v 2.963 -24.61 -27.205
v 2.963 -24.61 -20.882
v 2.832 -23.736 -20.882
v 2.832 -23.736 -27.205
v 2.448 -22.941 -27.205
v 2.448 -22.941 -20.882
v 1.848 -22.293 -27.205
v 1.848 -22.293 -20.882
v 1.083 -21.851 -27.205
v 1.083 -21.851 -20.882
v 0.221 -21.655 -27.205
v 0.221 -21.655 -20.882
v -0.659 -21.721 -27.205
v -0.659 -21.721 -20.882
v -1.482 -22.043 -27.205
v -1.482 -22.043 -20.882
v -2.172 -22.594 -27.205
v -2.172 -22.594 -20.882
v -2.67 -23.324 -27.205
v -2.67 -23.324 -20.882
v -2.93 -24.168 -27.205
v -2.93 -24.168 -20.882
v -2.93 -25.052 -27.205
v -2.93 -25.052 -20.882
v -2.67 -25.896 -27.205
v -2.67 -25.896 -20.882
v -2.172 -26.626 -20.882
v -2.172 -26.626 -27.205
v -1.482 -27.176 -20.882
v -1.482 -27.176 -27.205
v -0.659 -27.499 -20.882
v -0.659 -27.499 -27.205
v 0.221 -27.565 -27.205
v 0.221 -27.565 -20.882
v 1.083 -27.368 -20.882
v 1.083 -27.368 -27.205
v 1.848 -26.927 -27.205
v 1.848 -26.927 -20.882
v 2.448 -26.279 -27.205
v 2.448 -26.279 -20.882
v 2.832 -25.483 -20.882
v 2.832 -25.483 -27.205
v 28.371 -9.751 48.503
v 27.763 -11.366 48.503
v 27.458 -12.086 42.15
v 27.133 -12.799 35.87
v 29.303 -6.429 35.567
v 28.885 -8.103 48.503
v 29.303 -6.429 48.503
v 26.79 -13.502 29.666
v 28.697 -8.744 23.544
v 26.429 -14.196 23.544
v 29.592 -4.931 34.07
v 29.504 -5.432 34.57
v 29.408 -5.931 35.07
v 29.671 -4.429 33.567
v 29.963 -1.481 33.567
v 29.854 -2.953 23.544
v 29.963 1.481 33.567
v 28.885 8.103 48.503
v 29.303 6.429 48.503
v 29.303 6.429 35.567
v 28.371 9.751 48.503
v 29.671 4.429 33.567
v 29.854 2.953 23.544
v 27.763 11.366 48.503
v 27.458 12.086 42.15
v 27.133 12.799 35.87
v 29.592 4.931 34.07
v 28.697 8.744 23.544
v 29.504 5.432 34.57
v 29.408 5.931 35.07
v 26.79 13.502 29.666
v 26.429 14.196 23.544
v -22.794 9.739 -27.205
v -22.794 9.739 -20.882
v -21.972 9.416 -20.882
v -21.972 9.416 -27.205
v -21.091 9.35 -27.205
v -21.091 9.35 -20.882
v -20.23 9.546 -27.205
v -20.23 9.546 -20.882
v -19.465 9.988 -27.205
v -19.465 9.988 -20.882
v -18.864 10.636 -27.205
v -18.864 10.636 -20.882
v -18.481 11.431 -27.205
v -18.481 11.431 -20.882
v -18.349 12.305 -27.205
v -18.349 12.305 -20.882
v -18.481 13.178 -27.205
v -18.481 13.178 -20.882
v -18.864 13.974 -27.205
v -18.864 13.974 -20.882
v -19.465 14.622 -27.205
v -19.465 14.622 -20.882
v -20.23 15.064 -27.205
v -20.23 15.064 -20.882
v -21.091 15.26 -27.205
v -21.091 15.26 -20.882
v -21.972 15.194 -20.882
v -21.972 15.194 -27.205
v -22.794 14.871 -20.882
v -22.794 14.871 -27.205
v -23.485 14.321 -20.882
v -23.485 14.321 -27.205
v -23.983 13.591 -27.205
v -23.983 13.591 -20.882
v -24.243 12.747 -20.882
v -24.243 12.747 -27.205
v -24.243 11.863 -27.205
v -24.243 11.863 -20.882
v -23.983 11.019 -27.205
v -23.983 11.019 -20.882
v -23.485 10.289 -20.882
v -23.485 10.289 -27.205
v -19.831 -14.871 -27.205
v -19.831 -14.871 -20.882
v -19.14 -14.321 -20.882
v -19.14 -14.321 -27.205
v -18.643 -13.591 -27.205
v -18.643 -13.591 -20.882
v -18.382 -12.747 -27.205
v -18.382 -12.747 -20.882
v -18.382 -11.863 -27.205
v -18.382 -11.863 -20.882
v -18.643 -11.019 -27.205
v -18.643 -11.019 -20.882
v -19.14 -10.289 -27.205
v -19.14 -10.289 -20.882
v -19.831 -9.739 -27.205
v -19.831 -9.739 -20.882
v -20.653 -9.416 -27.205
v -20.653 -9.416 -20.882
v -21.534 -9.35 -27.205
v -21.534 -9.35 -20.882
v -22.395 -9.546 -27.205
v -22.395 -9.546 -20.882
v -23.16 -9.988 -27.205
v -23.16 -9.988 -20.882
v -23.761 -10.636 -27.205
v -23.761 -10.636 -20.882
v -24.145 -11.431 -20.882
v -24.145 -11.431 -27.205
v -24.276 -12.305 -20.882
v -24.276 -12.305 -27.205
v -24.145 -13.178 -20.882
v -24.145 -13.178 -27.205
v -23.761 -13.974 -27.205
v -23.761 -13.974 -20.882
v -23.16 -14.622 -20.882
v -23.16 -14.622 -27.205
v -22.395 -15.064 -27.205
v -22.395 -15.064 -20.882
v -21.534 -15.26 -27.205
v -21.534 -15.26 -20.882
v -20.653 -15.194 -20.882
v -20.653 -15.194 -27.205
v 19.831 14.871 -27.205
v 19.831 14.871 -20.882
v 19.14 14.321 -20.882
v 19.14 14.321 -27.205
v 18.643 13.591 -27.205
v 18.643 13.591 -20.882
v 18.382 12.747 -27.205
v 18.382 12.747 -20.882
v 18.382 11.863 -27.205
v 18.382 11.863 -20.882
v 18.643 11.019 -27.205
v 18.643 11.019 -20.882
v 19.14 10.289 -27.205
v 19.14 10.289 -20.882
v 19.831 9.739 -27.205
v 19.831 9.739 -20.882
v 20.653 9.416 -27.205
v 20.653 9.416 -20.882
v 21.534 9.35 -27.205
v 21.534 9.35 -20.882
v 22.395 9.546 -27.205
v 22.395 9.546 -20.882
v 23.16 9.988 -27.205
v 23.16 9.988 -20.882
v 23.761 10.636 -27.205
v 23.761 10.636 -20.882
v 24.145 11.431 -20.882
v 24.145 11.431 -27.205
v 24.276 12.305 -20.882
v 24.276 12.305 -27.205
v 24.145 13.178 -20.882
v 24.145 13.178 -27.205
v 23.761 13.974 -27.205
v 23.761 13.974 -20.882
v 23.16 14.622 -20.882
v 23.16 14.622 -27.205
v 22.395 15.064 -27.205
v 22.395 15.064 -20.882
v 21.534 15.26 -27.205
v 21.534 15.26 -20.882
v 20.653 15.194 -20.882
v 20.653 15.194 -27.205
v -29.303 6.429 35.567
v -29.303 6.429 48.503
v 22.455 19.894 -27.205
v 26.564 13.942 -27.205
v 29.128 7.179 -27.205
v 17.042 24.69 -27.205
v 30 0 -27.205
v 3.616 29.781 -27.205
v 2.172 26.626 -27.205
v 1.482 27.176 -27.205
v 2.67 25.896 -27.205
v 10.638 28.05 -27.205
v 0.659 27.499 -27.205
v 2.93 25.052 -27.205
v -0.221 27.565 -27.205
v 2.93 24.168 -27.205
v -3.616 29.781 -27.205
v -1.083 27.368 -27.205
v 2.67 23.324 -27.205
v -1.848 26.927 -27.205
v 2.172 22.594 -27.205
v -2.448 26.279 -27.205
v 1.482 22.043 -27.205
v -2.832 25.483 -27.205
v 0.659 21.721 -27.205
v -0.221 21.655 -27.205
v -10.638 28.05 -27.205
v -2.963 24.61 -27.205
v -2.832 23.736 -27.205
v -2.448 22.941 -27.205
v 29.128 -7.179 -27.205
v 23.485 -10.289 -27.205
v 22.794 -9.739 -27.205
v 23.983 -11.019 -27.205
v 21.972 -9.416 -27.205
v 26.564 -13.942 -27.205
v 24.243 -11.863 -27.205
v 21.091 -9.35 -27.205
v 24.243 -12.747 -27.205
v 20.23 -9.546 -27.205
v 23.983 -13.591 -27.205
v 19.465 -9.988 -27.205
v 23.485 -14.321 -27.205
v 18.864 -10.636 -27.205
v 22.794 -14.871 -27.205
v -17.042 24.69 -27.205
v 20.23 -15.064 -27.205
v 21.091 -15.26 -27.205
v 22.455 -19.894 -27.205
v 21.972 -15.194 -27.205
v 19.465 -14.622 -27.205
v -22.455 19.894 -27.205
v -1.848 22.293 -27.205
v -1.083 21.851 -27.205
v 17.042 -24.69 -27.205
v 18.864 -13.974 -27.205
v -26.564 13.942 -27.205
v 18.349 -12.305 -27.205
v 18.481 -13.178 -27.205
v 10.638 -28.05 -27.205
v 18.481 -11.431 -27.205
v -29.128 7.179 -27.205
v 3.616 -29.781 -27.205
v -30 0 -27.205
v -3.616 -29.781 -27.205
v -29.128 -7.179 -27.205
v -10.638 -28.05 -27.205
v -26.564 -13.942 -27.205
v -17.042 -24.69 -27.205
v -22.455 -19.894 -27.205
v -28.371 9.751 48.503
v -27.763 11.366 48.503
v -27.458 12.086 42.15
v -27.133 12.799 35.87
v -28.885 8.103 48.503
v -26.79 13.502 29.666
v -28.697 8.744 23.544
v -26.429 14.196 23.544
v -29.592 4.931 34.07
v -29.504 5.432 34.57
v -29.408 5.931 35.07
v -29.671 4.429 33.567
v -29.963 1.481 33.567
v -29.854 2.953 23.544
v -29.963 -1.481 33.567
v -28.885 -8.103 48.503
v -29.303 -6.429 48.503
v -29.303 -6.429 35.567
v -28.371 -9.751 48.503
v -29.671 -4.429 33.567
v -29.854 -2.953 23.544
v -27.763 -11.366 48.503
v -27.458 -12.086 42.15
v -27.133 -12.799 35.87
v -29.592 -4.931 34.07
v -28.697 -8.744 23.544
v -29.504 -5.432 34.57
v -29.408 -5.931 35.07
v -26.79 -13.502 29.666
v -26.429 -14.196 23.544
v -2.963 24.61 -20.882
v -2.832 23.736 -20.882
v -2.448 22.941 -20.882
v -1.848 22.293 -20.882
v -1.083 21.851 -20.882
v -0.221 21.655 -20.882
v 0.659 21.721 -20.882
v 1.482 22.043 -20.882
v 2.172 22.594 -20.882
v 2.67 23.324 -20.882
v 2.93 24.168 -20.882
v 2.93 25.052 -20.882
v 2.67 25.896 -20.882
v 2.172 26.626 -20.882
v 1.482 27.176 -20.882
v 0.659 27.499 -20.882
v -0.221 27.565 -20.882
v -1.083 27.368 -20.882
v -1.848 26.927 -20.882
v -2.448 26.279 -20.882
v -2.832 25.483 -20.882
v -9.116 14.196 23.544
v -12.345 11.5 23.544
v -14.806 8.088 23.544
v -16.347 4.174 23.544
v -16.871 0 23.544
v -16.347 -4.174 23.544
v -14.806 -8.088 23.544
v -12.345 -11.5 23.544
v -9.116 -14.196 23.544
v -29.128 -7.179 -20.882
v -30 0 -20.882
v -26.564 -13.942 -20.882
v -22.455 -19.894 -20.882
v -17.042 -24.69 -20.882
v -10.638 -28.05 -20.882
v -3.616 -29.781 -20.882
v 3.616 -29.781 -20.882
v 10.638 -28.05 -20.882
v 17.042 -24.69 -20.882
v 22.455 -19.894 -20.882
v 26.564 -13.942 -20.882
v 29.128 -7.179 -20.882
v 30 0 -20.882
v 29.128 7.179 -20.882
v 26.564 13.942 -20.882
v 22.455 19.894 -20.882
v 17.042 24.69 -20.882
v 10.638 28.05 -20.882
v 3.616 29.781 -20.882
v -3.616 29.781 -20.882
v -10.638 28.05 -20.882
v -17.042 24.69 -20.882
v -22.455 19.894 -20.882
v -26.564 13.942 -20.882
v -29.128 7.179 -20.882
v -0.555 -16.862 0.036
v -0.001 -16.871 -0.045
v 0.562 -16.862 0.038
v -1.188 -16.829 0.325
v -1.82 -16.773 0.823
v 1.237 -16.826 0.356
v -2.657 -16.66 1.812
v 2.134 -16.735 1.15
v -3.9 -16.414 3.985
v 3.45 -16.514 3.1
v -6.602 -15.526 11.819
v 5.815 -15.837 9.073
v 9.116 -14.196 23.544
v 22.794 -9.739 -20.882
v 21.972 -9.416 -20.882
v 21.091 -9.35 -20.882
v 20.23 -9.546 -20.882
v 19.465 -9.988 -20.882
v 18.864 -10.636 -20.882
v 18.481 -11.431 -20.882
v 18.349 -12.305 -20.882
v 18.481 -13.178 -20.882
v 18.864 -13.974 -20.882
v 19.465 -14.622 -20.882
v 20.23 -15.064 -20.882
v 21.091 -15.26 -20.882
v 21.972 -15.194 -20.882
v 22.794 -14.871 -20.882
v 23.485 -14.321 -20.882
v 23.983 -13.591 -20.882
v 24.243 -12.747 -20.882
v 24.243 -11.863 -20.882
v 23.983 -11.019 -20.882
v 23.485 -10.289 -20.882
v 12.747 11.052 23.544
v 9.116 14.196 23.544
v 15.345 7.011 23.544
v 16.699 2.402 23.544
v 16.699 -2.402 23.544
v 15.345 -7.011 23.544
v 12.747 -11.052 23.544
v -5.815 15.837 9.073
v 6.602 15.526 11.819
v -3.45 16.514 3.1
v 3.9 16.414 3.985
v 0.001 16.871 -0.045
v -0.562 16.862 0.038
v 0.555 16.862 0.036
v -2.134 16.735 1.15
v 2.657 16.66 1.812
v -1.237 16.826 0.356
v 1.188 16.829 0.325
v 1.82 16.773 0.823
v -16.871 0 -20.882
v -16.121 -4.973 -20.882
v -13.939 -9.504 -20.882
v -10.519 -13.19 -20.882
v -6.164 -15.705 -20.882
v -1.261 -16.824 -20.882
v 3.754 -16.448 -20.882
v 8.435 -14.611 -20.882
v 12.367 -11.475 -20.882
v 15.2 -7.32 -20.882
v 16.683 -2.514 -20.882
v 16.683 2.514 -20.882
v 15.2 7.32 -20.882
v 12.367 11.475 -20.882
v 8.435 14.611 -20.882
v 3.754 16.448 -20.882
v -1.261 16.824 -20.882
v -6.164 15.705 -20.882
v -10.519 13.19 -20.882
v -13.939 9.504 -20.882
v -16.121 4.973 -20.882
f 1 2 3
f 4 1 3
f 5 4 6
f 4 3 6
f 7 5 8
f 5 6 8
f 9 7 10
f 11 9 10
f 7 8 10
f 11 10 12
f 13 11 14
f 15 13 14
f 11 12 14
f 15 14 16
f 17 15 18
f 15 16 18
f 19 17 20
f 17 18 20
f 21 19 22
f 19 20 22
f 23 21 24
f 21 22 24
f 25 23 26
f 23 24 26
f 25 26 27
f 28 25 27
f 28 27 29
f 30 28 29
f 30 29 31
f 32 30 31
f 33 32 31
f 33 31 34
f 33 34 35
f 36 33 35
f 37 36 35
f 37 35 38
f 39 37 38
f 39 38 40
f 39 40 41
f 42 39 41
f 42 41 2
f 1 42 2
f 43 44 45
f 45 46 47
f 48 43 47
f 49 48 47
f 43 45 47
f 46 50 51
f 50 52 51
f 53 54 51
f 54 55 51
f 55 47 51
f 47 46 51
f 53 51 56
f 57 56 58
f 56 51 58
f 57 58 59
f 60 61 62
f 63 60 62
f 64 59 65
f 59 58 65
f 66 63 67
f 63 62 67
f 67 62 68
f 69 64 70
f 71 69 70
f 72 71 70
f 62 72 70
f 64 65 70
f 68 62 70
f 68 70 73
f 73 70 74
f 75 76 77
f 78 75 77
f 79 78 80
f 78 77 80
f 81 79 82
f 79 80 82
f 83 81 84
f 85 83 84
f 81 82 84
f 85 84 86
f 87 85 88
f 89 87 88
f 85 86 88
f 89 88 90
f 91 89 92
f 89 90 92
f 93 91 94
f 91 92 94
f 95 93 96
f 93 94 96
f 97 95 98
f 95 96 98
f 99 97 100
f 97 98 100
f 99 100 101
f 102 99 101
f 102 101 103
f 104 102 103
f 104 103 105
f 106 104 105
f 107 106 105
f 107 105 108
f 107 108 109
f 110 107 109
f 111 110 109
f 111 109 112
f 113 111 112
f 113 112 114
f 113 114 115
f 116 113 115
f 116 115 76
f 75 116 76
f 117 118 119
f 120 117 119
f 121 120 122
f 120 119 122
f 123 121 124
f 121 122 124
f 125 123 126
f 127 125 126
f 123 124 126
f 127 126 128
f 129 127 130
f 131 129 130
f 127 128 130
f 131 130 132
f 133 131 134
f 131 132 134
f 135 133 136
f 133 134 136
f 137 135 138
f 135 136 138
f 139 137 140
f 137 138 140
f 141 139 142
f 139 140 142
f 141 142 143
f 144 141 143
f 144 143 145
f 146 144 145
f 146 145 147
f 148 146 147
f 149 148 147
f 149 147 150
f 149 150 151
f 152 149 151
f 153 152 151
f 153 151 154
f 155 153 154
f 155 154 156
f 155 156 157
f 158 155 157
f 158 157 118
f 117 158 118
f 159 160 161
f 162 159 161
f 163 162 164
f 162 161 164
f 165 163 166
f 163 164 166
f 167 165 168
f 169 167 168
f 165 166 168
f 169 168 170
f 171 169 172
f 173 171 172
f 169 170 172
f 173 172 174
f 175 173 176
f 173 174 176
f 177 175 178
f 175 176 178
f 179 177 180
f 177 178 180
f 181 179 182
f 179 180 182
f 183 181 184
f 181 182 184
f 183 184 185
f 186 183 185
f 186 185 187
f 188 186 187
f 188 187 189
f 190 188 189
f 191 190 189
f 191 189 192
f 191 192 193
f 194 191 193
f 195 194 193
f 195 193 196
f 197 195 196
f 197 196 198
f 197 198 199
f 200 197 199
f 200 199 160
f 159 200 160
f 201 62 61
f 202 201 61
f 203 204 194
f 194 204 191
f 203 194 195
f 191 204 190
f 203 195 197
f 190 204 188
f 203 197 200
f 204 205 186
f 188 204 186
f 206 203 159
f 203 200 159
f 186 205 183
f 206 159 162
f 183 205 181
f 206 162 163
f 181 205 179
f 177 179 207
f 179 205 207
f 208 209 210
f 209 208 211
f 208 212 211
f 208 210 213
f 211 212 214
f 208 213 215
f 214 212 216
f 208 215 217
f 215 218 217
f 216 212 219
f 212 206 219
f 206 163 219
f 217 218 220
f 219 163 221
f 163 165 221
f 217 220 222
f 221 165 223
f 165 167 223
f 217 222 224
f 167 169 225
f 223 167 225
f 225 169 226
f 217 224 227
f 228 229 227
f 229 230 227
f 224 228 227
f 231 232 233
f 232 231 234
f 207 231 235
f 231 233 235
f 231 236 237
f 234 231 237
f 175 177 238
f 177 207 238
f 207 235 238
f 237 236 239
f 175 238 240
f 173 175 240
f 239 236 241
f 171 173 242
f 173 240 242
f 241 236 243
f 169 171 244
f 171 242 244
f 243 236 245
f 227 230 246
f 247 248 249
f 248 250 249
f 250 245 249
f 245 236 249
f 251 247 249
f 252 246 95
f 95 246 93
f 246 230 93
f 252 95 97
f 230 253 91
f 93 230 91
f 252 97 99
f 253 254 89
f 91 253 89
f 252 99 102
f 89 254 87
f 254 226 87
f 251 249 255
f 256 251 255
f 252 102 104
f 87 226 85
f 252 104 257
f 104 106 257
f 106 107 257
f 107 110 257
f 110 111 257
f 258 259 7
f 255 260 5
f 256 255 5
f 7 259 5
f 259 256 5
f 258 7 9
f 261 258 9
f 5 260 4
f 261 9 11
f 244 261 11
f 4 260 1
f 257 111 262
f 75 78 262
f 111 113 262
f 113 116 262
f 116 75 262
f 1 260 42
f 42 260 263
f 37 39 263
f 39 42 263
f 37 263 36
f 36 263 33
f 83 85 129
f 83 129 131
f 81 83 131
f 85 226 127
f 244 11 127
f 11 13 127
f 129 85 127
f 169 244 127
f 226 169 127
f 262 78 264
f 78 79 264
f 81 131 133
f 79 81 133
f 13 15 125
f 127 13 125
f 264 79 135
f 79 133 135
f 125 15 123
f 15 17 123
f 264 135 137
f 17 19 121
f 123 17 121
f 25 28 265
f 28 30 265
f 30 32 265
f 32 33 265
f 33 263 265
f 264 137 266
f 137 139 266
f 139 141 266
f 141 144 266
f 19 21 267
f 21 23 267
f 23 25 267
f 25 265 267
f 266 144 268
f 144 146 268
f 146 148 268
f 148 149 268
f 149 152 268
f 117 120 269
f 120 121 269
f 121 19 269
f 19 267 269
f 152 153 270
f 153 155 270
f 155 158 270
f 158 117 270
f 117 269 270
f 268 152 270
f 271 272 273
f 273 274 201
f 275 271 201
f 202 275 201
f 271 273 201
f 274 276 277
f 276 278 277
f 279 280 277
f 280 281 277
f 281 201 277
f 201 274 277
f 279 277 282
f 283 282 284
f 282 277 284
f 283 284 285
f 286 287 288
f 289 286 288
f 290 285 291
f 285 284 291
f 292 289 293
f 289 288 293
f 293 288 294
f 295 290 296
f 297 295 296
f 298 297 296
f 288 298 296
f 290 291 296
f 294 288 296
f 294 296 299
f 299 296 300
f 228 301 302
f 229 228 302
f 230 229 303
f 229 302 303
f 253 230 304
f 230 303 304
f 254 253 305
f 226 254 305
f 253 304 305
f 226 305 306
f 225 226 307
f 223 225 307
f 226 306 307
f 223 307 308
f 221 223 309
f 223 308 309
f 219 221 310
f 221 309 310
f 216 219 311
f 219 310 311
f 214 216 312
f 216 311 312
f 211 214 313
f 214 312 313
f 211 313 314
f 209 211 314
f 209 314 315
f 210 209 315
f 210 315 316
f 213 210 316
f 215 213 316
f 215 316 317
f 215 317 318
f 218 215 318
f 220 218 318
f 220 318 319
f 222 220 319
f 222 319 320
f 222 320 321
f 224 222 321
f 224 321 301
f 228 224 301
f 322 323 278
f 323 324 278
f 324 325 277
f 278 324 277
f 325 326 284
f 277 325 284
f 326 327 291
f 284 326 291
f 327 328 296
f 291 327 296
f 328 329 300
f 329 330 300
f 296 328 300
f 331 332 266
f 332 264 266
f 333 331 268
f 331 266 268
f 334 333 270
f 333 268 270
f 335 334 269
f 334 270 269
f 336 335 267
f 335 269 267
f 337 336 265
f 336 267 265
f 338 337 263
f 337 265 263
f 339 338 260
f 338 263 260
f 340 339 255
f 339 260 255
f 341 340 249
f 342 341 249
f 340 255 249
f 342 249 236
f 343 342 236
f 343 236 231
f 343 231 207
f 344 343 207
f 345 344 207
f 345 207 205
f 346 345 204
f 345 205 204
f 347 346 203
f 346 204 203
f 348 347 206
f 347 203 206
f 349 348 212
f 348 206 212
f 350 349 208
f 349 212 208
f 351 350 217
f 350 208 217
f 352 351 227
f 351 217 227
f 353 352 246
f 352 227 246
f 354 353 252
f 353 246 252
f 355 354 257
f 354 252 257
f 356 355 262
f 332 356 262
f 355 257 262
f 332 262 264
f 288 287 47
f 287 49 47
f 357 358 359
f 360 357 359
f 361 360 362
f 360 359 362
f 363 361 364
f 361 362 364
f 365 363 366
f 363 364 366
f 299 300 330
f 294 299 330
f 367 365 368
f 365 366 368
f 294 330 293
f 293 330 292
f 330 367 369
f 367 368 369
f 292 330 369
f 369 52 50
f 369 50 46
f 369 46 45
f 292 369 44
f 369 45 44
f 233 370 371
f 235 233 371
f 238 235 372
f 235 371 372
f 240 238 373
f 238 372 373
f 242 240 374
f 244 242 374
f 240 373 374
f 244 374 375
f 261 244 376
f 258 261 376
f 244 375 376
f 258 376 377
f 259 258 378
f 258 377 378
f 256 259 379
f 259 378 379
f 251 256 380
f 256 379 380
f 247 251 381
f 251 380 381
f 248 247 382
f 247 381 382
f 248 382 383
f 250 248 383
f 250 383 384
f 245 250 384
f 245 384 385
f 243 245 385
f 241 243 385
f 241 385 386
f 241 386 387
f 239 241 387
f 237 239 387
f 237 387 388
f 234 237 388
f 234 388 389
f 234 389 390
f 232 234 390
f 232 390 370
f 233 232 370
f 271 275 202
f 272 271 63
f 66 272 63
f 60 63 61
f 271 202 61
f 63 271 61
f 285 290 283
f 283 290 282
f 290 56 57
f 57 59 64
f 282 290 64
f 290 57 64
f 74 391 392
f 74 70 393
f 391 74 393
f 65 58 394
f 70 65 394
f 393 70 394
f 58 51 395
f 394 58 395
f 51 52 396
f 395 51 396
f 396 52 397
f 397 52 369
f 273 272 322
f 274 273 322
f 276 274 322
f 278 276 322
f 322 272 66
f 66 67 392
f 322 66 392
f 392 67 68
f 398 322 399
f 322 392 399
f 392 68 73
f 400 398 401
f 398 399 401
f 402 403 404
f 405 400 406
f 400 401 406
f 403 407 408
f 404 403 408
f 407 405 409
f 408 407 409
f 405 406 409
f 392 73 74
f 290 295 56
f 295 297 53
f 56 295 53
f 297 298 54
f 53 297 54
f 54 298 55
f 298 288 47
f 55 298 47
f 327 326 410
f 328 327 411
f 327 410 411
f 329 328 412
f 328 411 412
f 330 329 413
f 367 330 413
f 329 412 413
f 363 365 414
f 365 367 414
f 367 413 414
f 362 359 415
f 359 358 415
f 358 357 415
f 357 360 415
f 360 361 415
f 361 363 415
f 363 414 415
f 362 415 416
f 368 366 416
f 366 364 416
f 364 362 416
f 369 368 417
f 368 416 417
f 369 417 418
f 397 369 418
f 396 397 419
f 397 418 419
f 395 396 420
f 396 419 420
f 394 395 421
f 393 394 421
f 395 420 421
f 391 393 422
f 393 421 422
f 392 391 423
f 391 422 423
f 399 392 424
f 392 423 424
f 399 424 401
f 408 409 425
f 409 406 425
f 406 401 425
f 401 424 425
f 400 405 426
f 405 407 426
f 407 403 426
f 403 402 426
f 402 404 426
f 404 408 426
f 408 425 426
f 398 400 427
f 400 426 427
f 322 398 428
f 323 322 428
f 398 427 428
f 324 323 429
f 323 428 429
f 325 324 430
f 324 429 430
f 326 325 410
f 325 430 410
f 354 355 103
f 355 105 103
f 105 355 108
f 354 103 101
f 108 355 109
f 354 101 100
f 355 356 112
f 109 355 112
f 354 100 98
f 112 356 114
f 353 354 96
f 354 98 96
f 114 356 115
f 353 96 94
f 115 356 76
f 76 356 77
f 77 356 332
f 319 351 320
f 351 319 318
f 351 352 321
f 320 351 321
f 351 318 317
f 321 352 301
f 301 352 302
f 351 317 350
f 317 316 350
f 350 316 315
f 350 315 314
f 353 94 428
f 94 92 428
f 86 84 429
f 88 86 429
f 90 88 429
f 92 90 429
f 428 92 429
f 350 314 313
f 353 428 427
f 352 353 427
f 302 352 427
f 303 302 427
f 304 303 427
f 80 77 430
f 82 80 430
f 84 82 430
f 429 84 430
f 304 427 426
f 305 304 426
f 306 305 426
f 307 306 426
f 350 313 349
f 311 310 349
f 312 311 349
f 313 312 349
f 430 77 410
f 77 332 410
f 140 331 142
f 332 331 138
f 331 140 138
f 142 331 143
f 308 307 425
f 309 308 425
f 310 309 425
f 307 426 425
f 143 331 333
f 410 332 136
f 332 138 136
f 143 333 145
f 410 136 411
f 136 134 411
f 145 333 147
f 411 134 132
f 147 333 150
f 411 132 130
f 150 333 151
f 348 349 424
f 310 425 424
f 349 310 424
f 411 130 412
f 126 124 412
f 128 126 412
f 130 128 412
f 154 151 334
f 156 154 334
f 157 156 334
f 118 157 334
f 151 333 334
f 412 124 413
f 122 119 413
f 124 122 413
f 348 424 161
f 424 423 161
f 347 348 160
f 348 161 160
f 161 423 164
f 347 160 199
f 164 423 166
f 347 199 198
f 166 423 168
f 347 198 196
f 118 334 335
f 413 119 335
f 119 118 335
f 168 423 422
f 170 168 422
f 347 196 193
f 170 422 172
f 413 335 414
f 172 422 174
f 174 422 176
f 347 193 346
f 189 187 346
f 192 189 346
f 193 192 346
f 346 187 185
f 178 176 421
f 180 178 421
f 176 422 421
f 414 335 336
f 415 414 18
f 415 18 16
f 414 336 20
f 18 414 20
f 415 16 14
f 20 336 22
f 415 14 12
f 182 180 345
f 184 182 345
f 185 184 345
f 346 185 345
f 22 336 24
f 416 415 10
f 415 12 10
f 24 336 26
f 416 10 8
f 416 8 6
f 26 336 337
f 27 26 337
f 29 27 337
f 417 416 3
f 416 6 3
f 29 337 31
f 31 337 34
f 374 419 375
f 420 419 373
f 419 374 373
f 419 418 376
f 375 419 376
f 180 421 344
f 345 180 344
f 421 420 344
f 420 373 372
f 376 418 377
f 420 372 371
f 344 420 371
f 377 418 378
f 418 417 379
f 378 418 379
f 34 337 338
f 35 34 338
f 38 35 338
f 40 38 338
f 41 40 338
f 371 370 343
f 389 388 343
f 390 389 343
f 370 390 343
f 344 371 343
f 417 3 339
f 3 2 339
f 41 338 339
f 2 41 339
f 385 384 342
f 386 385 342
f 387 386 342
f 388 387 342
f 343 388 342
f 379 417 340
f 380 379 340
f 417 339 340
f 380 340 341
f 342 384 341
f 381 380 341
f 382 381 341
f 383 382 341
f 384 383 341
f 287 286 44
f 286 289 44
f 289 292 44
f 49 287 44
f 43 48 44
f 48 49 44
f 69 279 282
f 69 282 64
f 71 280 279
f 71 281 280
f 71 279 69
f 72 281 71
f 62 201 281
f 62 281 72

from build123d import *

# Parameters (mm, degrees)
SKETCH001_R        = 2.963423
POCKET_DEPTH       = 233.757944
POLARPATTERN_COUNT = 6
POCKET001_DEPTH    = 41
CHAMFER_SIZE       = 2


with BuildPart() as part:
    # Sketch → Revolution (revolve)
    with BuildSketch(Plane.XZ):
        Polygon((-30, 48.502502), (-30, 23.544098), (-16.870987, 23.544098), (-16.870987, -20.881861), (-30, -20.881861), (-30, -27.204653), (0, -27.204653), (0, 48.502502), align=None)
    revolve(axis=Axis((0, 0, 0), (0, 0, 1)))

    # Sketch001 (on Face4 of Revolution) → Pocket (cut, through all)
    with BuildSketch(Plane(origin=(0, 0, -20.881861), x_dir=(-1, 0, 0), z_dir=(0, 0, 1))):
        with Locations((0, -24.60987)):
            Circle(SKETCH001_R)
    pocket = extrude(amount=-POCKET_DEPTH, mode=Mode.SUBTRACT)

    # PolarPattern: Pocket ×6 about axis
    polarpattern_axis = Axis((0, 0, -20.881861), (0, 0, 1))
    for i in range(1, POLARPATTERN_COUNT):
        add(pocket.rotate(polarpattern_axis, i * 360 / POLARPATTERN_COUNT), mode=Mode.SUBTRACT)

    # Sketch002 → Pocket001 (cut, symmetric)
    with BuildSketch(Plane.YZ):
        Polygon((-46.942223, 56.337571), (-46.942223, 49.89431), (-46.942223, -10.657207), (-18.07431, -10.657207), (-11.208346, 49.89431), (-6.428893, 49.89431), (-6.428893, 33.567371), (6.428893, 33.567371), (6.428893, 49.89431), (11.208346, 49.89431), (18.07431, -10.657207), (46.942223, -10.657207), (46.942223, 49.89431), (46.942223, 56.337571), align=None)
    extrude(amount=POCKET001_DEPTH, both=True, mode=Mode.SUBTRACT)

    # Chamfer
    chamfer_edges = [part.edges().sort_by_distance(p)[0] for p in [
        (0, -6.428893, 33.567371),
        (0, 6.428893, 33.567371),
    ]]
    chamfer(chamfer_edges, length=CHAMFER_SIZE)


solid = part.part
